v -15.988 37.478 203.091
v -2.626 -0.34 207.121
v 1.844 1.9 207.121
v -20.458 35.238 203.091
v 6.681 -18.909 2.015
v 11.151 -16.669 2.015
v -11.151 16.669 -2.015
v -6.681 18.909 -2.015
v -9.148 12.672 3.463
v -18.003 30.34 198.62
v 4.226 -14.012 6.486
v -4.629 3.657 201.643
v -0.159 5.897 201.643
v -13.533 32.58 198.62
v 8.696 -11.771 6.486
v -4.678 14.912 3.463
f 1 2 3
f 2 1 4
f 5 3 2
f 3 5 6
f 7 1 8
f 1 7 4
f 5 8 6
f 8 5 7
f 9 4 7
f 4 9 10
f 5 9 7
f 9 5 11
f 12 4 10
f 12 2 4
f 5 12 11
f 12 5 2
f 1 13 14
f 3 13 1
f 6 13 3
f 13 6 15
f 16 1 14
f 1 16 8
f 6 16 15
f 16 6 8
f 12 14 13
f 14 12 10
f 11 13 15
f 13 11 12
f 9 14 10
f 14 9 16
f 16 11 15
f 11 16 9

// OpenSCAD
// mount_arm.scad
// ——————————————————————————————————————————————————
// Connects the two brackets at a given offset, with flange on each end
// OUTPUT:  single-arm spacer between block bracket and perch bracket
// ——————————————————————————————————————————————————

/* ====== USER PARAMETERS ====== */
// vector from block‐bracket plate face to perch‐bracket plate face [X, Y, Z] (mm)
arm_offset = [0, 200, -50];    
// arm cross-section width & thickness (mm)
arm_w = 40;                    
arm_t = 5;                    

/* ====== MODULE ====== */
module mount_arm() {
  // create a rectangular tube (hollow box) of length = |arm_offset|
  l = norm(arm_offset);
  // orient along XY plane, then rotate into place
  rotate(a = [0, atan2(arm_offset[2], sqrt(arm_offset[0]*arm_offset[0] + arm_offset[1]*arm_offset[1]))*180/PI, 
                atan2(arm_offset[1], arm_offset[0])*180/PI])
  translate([0, -arm_t/2, -arm_w/2])
    difference() {
      cube([ l, arm_t, arm_w ]);
      translate([arm_t, 0, arm_t])
        cube([ l - 2*arm_t, arm_t, arm_w - 2*arm_t ]);
    }
}

/* ====== RENDER ====== */
mount_arm();
